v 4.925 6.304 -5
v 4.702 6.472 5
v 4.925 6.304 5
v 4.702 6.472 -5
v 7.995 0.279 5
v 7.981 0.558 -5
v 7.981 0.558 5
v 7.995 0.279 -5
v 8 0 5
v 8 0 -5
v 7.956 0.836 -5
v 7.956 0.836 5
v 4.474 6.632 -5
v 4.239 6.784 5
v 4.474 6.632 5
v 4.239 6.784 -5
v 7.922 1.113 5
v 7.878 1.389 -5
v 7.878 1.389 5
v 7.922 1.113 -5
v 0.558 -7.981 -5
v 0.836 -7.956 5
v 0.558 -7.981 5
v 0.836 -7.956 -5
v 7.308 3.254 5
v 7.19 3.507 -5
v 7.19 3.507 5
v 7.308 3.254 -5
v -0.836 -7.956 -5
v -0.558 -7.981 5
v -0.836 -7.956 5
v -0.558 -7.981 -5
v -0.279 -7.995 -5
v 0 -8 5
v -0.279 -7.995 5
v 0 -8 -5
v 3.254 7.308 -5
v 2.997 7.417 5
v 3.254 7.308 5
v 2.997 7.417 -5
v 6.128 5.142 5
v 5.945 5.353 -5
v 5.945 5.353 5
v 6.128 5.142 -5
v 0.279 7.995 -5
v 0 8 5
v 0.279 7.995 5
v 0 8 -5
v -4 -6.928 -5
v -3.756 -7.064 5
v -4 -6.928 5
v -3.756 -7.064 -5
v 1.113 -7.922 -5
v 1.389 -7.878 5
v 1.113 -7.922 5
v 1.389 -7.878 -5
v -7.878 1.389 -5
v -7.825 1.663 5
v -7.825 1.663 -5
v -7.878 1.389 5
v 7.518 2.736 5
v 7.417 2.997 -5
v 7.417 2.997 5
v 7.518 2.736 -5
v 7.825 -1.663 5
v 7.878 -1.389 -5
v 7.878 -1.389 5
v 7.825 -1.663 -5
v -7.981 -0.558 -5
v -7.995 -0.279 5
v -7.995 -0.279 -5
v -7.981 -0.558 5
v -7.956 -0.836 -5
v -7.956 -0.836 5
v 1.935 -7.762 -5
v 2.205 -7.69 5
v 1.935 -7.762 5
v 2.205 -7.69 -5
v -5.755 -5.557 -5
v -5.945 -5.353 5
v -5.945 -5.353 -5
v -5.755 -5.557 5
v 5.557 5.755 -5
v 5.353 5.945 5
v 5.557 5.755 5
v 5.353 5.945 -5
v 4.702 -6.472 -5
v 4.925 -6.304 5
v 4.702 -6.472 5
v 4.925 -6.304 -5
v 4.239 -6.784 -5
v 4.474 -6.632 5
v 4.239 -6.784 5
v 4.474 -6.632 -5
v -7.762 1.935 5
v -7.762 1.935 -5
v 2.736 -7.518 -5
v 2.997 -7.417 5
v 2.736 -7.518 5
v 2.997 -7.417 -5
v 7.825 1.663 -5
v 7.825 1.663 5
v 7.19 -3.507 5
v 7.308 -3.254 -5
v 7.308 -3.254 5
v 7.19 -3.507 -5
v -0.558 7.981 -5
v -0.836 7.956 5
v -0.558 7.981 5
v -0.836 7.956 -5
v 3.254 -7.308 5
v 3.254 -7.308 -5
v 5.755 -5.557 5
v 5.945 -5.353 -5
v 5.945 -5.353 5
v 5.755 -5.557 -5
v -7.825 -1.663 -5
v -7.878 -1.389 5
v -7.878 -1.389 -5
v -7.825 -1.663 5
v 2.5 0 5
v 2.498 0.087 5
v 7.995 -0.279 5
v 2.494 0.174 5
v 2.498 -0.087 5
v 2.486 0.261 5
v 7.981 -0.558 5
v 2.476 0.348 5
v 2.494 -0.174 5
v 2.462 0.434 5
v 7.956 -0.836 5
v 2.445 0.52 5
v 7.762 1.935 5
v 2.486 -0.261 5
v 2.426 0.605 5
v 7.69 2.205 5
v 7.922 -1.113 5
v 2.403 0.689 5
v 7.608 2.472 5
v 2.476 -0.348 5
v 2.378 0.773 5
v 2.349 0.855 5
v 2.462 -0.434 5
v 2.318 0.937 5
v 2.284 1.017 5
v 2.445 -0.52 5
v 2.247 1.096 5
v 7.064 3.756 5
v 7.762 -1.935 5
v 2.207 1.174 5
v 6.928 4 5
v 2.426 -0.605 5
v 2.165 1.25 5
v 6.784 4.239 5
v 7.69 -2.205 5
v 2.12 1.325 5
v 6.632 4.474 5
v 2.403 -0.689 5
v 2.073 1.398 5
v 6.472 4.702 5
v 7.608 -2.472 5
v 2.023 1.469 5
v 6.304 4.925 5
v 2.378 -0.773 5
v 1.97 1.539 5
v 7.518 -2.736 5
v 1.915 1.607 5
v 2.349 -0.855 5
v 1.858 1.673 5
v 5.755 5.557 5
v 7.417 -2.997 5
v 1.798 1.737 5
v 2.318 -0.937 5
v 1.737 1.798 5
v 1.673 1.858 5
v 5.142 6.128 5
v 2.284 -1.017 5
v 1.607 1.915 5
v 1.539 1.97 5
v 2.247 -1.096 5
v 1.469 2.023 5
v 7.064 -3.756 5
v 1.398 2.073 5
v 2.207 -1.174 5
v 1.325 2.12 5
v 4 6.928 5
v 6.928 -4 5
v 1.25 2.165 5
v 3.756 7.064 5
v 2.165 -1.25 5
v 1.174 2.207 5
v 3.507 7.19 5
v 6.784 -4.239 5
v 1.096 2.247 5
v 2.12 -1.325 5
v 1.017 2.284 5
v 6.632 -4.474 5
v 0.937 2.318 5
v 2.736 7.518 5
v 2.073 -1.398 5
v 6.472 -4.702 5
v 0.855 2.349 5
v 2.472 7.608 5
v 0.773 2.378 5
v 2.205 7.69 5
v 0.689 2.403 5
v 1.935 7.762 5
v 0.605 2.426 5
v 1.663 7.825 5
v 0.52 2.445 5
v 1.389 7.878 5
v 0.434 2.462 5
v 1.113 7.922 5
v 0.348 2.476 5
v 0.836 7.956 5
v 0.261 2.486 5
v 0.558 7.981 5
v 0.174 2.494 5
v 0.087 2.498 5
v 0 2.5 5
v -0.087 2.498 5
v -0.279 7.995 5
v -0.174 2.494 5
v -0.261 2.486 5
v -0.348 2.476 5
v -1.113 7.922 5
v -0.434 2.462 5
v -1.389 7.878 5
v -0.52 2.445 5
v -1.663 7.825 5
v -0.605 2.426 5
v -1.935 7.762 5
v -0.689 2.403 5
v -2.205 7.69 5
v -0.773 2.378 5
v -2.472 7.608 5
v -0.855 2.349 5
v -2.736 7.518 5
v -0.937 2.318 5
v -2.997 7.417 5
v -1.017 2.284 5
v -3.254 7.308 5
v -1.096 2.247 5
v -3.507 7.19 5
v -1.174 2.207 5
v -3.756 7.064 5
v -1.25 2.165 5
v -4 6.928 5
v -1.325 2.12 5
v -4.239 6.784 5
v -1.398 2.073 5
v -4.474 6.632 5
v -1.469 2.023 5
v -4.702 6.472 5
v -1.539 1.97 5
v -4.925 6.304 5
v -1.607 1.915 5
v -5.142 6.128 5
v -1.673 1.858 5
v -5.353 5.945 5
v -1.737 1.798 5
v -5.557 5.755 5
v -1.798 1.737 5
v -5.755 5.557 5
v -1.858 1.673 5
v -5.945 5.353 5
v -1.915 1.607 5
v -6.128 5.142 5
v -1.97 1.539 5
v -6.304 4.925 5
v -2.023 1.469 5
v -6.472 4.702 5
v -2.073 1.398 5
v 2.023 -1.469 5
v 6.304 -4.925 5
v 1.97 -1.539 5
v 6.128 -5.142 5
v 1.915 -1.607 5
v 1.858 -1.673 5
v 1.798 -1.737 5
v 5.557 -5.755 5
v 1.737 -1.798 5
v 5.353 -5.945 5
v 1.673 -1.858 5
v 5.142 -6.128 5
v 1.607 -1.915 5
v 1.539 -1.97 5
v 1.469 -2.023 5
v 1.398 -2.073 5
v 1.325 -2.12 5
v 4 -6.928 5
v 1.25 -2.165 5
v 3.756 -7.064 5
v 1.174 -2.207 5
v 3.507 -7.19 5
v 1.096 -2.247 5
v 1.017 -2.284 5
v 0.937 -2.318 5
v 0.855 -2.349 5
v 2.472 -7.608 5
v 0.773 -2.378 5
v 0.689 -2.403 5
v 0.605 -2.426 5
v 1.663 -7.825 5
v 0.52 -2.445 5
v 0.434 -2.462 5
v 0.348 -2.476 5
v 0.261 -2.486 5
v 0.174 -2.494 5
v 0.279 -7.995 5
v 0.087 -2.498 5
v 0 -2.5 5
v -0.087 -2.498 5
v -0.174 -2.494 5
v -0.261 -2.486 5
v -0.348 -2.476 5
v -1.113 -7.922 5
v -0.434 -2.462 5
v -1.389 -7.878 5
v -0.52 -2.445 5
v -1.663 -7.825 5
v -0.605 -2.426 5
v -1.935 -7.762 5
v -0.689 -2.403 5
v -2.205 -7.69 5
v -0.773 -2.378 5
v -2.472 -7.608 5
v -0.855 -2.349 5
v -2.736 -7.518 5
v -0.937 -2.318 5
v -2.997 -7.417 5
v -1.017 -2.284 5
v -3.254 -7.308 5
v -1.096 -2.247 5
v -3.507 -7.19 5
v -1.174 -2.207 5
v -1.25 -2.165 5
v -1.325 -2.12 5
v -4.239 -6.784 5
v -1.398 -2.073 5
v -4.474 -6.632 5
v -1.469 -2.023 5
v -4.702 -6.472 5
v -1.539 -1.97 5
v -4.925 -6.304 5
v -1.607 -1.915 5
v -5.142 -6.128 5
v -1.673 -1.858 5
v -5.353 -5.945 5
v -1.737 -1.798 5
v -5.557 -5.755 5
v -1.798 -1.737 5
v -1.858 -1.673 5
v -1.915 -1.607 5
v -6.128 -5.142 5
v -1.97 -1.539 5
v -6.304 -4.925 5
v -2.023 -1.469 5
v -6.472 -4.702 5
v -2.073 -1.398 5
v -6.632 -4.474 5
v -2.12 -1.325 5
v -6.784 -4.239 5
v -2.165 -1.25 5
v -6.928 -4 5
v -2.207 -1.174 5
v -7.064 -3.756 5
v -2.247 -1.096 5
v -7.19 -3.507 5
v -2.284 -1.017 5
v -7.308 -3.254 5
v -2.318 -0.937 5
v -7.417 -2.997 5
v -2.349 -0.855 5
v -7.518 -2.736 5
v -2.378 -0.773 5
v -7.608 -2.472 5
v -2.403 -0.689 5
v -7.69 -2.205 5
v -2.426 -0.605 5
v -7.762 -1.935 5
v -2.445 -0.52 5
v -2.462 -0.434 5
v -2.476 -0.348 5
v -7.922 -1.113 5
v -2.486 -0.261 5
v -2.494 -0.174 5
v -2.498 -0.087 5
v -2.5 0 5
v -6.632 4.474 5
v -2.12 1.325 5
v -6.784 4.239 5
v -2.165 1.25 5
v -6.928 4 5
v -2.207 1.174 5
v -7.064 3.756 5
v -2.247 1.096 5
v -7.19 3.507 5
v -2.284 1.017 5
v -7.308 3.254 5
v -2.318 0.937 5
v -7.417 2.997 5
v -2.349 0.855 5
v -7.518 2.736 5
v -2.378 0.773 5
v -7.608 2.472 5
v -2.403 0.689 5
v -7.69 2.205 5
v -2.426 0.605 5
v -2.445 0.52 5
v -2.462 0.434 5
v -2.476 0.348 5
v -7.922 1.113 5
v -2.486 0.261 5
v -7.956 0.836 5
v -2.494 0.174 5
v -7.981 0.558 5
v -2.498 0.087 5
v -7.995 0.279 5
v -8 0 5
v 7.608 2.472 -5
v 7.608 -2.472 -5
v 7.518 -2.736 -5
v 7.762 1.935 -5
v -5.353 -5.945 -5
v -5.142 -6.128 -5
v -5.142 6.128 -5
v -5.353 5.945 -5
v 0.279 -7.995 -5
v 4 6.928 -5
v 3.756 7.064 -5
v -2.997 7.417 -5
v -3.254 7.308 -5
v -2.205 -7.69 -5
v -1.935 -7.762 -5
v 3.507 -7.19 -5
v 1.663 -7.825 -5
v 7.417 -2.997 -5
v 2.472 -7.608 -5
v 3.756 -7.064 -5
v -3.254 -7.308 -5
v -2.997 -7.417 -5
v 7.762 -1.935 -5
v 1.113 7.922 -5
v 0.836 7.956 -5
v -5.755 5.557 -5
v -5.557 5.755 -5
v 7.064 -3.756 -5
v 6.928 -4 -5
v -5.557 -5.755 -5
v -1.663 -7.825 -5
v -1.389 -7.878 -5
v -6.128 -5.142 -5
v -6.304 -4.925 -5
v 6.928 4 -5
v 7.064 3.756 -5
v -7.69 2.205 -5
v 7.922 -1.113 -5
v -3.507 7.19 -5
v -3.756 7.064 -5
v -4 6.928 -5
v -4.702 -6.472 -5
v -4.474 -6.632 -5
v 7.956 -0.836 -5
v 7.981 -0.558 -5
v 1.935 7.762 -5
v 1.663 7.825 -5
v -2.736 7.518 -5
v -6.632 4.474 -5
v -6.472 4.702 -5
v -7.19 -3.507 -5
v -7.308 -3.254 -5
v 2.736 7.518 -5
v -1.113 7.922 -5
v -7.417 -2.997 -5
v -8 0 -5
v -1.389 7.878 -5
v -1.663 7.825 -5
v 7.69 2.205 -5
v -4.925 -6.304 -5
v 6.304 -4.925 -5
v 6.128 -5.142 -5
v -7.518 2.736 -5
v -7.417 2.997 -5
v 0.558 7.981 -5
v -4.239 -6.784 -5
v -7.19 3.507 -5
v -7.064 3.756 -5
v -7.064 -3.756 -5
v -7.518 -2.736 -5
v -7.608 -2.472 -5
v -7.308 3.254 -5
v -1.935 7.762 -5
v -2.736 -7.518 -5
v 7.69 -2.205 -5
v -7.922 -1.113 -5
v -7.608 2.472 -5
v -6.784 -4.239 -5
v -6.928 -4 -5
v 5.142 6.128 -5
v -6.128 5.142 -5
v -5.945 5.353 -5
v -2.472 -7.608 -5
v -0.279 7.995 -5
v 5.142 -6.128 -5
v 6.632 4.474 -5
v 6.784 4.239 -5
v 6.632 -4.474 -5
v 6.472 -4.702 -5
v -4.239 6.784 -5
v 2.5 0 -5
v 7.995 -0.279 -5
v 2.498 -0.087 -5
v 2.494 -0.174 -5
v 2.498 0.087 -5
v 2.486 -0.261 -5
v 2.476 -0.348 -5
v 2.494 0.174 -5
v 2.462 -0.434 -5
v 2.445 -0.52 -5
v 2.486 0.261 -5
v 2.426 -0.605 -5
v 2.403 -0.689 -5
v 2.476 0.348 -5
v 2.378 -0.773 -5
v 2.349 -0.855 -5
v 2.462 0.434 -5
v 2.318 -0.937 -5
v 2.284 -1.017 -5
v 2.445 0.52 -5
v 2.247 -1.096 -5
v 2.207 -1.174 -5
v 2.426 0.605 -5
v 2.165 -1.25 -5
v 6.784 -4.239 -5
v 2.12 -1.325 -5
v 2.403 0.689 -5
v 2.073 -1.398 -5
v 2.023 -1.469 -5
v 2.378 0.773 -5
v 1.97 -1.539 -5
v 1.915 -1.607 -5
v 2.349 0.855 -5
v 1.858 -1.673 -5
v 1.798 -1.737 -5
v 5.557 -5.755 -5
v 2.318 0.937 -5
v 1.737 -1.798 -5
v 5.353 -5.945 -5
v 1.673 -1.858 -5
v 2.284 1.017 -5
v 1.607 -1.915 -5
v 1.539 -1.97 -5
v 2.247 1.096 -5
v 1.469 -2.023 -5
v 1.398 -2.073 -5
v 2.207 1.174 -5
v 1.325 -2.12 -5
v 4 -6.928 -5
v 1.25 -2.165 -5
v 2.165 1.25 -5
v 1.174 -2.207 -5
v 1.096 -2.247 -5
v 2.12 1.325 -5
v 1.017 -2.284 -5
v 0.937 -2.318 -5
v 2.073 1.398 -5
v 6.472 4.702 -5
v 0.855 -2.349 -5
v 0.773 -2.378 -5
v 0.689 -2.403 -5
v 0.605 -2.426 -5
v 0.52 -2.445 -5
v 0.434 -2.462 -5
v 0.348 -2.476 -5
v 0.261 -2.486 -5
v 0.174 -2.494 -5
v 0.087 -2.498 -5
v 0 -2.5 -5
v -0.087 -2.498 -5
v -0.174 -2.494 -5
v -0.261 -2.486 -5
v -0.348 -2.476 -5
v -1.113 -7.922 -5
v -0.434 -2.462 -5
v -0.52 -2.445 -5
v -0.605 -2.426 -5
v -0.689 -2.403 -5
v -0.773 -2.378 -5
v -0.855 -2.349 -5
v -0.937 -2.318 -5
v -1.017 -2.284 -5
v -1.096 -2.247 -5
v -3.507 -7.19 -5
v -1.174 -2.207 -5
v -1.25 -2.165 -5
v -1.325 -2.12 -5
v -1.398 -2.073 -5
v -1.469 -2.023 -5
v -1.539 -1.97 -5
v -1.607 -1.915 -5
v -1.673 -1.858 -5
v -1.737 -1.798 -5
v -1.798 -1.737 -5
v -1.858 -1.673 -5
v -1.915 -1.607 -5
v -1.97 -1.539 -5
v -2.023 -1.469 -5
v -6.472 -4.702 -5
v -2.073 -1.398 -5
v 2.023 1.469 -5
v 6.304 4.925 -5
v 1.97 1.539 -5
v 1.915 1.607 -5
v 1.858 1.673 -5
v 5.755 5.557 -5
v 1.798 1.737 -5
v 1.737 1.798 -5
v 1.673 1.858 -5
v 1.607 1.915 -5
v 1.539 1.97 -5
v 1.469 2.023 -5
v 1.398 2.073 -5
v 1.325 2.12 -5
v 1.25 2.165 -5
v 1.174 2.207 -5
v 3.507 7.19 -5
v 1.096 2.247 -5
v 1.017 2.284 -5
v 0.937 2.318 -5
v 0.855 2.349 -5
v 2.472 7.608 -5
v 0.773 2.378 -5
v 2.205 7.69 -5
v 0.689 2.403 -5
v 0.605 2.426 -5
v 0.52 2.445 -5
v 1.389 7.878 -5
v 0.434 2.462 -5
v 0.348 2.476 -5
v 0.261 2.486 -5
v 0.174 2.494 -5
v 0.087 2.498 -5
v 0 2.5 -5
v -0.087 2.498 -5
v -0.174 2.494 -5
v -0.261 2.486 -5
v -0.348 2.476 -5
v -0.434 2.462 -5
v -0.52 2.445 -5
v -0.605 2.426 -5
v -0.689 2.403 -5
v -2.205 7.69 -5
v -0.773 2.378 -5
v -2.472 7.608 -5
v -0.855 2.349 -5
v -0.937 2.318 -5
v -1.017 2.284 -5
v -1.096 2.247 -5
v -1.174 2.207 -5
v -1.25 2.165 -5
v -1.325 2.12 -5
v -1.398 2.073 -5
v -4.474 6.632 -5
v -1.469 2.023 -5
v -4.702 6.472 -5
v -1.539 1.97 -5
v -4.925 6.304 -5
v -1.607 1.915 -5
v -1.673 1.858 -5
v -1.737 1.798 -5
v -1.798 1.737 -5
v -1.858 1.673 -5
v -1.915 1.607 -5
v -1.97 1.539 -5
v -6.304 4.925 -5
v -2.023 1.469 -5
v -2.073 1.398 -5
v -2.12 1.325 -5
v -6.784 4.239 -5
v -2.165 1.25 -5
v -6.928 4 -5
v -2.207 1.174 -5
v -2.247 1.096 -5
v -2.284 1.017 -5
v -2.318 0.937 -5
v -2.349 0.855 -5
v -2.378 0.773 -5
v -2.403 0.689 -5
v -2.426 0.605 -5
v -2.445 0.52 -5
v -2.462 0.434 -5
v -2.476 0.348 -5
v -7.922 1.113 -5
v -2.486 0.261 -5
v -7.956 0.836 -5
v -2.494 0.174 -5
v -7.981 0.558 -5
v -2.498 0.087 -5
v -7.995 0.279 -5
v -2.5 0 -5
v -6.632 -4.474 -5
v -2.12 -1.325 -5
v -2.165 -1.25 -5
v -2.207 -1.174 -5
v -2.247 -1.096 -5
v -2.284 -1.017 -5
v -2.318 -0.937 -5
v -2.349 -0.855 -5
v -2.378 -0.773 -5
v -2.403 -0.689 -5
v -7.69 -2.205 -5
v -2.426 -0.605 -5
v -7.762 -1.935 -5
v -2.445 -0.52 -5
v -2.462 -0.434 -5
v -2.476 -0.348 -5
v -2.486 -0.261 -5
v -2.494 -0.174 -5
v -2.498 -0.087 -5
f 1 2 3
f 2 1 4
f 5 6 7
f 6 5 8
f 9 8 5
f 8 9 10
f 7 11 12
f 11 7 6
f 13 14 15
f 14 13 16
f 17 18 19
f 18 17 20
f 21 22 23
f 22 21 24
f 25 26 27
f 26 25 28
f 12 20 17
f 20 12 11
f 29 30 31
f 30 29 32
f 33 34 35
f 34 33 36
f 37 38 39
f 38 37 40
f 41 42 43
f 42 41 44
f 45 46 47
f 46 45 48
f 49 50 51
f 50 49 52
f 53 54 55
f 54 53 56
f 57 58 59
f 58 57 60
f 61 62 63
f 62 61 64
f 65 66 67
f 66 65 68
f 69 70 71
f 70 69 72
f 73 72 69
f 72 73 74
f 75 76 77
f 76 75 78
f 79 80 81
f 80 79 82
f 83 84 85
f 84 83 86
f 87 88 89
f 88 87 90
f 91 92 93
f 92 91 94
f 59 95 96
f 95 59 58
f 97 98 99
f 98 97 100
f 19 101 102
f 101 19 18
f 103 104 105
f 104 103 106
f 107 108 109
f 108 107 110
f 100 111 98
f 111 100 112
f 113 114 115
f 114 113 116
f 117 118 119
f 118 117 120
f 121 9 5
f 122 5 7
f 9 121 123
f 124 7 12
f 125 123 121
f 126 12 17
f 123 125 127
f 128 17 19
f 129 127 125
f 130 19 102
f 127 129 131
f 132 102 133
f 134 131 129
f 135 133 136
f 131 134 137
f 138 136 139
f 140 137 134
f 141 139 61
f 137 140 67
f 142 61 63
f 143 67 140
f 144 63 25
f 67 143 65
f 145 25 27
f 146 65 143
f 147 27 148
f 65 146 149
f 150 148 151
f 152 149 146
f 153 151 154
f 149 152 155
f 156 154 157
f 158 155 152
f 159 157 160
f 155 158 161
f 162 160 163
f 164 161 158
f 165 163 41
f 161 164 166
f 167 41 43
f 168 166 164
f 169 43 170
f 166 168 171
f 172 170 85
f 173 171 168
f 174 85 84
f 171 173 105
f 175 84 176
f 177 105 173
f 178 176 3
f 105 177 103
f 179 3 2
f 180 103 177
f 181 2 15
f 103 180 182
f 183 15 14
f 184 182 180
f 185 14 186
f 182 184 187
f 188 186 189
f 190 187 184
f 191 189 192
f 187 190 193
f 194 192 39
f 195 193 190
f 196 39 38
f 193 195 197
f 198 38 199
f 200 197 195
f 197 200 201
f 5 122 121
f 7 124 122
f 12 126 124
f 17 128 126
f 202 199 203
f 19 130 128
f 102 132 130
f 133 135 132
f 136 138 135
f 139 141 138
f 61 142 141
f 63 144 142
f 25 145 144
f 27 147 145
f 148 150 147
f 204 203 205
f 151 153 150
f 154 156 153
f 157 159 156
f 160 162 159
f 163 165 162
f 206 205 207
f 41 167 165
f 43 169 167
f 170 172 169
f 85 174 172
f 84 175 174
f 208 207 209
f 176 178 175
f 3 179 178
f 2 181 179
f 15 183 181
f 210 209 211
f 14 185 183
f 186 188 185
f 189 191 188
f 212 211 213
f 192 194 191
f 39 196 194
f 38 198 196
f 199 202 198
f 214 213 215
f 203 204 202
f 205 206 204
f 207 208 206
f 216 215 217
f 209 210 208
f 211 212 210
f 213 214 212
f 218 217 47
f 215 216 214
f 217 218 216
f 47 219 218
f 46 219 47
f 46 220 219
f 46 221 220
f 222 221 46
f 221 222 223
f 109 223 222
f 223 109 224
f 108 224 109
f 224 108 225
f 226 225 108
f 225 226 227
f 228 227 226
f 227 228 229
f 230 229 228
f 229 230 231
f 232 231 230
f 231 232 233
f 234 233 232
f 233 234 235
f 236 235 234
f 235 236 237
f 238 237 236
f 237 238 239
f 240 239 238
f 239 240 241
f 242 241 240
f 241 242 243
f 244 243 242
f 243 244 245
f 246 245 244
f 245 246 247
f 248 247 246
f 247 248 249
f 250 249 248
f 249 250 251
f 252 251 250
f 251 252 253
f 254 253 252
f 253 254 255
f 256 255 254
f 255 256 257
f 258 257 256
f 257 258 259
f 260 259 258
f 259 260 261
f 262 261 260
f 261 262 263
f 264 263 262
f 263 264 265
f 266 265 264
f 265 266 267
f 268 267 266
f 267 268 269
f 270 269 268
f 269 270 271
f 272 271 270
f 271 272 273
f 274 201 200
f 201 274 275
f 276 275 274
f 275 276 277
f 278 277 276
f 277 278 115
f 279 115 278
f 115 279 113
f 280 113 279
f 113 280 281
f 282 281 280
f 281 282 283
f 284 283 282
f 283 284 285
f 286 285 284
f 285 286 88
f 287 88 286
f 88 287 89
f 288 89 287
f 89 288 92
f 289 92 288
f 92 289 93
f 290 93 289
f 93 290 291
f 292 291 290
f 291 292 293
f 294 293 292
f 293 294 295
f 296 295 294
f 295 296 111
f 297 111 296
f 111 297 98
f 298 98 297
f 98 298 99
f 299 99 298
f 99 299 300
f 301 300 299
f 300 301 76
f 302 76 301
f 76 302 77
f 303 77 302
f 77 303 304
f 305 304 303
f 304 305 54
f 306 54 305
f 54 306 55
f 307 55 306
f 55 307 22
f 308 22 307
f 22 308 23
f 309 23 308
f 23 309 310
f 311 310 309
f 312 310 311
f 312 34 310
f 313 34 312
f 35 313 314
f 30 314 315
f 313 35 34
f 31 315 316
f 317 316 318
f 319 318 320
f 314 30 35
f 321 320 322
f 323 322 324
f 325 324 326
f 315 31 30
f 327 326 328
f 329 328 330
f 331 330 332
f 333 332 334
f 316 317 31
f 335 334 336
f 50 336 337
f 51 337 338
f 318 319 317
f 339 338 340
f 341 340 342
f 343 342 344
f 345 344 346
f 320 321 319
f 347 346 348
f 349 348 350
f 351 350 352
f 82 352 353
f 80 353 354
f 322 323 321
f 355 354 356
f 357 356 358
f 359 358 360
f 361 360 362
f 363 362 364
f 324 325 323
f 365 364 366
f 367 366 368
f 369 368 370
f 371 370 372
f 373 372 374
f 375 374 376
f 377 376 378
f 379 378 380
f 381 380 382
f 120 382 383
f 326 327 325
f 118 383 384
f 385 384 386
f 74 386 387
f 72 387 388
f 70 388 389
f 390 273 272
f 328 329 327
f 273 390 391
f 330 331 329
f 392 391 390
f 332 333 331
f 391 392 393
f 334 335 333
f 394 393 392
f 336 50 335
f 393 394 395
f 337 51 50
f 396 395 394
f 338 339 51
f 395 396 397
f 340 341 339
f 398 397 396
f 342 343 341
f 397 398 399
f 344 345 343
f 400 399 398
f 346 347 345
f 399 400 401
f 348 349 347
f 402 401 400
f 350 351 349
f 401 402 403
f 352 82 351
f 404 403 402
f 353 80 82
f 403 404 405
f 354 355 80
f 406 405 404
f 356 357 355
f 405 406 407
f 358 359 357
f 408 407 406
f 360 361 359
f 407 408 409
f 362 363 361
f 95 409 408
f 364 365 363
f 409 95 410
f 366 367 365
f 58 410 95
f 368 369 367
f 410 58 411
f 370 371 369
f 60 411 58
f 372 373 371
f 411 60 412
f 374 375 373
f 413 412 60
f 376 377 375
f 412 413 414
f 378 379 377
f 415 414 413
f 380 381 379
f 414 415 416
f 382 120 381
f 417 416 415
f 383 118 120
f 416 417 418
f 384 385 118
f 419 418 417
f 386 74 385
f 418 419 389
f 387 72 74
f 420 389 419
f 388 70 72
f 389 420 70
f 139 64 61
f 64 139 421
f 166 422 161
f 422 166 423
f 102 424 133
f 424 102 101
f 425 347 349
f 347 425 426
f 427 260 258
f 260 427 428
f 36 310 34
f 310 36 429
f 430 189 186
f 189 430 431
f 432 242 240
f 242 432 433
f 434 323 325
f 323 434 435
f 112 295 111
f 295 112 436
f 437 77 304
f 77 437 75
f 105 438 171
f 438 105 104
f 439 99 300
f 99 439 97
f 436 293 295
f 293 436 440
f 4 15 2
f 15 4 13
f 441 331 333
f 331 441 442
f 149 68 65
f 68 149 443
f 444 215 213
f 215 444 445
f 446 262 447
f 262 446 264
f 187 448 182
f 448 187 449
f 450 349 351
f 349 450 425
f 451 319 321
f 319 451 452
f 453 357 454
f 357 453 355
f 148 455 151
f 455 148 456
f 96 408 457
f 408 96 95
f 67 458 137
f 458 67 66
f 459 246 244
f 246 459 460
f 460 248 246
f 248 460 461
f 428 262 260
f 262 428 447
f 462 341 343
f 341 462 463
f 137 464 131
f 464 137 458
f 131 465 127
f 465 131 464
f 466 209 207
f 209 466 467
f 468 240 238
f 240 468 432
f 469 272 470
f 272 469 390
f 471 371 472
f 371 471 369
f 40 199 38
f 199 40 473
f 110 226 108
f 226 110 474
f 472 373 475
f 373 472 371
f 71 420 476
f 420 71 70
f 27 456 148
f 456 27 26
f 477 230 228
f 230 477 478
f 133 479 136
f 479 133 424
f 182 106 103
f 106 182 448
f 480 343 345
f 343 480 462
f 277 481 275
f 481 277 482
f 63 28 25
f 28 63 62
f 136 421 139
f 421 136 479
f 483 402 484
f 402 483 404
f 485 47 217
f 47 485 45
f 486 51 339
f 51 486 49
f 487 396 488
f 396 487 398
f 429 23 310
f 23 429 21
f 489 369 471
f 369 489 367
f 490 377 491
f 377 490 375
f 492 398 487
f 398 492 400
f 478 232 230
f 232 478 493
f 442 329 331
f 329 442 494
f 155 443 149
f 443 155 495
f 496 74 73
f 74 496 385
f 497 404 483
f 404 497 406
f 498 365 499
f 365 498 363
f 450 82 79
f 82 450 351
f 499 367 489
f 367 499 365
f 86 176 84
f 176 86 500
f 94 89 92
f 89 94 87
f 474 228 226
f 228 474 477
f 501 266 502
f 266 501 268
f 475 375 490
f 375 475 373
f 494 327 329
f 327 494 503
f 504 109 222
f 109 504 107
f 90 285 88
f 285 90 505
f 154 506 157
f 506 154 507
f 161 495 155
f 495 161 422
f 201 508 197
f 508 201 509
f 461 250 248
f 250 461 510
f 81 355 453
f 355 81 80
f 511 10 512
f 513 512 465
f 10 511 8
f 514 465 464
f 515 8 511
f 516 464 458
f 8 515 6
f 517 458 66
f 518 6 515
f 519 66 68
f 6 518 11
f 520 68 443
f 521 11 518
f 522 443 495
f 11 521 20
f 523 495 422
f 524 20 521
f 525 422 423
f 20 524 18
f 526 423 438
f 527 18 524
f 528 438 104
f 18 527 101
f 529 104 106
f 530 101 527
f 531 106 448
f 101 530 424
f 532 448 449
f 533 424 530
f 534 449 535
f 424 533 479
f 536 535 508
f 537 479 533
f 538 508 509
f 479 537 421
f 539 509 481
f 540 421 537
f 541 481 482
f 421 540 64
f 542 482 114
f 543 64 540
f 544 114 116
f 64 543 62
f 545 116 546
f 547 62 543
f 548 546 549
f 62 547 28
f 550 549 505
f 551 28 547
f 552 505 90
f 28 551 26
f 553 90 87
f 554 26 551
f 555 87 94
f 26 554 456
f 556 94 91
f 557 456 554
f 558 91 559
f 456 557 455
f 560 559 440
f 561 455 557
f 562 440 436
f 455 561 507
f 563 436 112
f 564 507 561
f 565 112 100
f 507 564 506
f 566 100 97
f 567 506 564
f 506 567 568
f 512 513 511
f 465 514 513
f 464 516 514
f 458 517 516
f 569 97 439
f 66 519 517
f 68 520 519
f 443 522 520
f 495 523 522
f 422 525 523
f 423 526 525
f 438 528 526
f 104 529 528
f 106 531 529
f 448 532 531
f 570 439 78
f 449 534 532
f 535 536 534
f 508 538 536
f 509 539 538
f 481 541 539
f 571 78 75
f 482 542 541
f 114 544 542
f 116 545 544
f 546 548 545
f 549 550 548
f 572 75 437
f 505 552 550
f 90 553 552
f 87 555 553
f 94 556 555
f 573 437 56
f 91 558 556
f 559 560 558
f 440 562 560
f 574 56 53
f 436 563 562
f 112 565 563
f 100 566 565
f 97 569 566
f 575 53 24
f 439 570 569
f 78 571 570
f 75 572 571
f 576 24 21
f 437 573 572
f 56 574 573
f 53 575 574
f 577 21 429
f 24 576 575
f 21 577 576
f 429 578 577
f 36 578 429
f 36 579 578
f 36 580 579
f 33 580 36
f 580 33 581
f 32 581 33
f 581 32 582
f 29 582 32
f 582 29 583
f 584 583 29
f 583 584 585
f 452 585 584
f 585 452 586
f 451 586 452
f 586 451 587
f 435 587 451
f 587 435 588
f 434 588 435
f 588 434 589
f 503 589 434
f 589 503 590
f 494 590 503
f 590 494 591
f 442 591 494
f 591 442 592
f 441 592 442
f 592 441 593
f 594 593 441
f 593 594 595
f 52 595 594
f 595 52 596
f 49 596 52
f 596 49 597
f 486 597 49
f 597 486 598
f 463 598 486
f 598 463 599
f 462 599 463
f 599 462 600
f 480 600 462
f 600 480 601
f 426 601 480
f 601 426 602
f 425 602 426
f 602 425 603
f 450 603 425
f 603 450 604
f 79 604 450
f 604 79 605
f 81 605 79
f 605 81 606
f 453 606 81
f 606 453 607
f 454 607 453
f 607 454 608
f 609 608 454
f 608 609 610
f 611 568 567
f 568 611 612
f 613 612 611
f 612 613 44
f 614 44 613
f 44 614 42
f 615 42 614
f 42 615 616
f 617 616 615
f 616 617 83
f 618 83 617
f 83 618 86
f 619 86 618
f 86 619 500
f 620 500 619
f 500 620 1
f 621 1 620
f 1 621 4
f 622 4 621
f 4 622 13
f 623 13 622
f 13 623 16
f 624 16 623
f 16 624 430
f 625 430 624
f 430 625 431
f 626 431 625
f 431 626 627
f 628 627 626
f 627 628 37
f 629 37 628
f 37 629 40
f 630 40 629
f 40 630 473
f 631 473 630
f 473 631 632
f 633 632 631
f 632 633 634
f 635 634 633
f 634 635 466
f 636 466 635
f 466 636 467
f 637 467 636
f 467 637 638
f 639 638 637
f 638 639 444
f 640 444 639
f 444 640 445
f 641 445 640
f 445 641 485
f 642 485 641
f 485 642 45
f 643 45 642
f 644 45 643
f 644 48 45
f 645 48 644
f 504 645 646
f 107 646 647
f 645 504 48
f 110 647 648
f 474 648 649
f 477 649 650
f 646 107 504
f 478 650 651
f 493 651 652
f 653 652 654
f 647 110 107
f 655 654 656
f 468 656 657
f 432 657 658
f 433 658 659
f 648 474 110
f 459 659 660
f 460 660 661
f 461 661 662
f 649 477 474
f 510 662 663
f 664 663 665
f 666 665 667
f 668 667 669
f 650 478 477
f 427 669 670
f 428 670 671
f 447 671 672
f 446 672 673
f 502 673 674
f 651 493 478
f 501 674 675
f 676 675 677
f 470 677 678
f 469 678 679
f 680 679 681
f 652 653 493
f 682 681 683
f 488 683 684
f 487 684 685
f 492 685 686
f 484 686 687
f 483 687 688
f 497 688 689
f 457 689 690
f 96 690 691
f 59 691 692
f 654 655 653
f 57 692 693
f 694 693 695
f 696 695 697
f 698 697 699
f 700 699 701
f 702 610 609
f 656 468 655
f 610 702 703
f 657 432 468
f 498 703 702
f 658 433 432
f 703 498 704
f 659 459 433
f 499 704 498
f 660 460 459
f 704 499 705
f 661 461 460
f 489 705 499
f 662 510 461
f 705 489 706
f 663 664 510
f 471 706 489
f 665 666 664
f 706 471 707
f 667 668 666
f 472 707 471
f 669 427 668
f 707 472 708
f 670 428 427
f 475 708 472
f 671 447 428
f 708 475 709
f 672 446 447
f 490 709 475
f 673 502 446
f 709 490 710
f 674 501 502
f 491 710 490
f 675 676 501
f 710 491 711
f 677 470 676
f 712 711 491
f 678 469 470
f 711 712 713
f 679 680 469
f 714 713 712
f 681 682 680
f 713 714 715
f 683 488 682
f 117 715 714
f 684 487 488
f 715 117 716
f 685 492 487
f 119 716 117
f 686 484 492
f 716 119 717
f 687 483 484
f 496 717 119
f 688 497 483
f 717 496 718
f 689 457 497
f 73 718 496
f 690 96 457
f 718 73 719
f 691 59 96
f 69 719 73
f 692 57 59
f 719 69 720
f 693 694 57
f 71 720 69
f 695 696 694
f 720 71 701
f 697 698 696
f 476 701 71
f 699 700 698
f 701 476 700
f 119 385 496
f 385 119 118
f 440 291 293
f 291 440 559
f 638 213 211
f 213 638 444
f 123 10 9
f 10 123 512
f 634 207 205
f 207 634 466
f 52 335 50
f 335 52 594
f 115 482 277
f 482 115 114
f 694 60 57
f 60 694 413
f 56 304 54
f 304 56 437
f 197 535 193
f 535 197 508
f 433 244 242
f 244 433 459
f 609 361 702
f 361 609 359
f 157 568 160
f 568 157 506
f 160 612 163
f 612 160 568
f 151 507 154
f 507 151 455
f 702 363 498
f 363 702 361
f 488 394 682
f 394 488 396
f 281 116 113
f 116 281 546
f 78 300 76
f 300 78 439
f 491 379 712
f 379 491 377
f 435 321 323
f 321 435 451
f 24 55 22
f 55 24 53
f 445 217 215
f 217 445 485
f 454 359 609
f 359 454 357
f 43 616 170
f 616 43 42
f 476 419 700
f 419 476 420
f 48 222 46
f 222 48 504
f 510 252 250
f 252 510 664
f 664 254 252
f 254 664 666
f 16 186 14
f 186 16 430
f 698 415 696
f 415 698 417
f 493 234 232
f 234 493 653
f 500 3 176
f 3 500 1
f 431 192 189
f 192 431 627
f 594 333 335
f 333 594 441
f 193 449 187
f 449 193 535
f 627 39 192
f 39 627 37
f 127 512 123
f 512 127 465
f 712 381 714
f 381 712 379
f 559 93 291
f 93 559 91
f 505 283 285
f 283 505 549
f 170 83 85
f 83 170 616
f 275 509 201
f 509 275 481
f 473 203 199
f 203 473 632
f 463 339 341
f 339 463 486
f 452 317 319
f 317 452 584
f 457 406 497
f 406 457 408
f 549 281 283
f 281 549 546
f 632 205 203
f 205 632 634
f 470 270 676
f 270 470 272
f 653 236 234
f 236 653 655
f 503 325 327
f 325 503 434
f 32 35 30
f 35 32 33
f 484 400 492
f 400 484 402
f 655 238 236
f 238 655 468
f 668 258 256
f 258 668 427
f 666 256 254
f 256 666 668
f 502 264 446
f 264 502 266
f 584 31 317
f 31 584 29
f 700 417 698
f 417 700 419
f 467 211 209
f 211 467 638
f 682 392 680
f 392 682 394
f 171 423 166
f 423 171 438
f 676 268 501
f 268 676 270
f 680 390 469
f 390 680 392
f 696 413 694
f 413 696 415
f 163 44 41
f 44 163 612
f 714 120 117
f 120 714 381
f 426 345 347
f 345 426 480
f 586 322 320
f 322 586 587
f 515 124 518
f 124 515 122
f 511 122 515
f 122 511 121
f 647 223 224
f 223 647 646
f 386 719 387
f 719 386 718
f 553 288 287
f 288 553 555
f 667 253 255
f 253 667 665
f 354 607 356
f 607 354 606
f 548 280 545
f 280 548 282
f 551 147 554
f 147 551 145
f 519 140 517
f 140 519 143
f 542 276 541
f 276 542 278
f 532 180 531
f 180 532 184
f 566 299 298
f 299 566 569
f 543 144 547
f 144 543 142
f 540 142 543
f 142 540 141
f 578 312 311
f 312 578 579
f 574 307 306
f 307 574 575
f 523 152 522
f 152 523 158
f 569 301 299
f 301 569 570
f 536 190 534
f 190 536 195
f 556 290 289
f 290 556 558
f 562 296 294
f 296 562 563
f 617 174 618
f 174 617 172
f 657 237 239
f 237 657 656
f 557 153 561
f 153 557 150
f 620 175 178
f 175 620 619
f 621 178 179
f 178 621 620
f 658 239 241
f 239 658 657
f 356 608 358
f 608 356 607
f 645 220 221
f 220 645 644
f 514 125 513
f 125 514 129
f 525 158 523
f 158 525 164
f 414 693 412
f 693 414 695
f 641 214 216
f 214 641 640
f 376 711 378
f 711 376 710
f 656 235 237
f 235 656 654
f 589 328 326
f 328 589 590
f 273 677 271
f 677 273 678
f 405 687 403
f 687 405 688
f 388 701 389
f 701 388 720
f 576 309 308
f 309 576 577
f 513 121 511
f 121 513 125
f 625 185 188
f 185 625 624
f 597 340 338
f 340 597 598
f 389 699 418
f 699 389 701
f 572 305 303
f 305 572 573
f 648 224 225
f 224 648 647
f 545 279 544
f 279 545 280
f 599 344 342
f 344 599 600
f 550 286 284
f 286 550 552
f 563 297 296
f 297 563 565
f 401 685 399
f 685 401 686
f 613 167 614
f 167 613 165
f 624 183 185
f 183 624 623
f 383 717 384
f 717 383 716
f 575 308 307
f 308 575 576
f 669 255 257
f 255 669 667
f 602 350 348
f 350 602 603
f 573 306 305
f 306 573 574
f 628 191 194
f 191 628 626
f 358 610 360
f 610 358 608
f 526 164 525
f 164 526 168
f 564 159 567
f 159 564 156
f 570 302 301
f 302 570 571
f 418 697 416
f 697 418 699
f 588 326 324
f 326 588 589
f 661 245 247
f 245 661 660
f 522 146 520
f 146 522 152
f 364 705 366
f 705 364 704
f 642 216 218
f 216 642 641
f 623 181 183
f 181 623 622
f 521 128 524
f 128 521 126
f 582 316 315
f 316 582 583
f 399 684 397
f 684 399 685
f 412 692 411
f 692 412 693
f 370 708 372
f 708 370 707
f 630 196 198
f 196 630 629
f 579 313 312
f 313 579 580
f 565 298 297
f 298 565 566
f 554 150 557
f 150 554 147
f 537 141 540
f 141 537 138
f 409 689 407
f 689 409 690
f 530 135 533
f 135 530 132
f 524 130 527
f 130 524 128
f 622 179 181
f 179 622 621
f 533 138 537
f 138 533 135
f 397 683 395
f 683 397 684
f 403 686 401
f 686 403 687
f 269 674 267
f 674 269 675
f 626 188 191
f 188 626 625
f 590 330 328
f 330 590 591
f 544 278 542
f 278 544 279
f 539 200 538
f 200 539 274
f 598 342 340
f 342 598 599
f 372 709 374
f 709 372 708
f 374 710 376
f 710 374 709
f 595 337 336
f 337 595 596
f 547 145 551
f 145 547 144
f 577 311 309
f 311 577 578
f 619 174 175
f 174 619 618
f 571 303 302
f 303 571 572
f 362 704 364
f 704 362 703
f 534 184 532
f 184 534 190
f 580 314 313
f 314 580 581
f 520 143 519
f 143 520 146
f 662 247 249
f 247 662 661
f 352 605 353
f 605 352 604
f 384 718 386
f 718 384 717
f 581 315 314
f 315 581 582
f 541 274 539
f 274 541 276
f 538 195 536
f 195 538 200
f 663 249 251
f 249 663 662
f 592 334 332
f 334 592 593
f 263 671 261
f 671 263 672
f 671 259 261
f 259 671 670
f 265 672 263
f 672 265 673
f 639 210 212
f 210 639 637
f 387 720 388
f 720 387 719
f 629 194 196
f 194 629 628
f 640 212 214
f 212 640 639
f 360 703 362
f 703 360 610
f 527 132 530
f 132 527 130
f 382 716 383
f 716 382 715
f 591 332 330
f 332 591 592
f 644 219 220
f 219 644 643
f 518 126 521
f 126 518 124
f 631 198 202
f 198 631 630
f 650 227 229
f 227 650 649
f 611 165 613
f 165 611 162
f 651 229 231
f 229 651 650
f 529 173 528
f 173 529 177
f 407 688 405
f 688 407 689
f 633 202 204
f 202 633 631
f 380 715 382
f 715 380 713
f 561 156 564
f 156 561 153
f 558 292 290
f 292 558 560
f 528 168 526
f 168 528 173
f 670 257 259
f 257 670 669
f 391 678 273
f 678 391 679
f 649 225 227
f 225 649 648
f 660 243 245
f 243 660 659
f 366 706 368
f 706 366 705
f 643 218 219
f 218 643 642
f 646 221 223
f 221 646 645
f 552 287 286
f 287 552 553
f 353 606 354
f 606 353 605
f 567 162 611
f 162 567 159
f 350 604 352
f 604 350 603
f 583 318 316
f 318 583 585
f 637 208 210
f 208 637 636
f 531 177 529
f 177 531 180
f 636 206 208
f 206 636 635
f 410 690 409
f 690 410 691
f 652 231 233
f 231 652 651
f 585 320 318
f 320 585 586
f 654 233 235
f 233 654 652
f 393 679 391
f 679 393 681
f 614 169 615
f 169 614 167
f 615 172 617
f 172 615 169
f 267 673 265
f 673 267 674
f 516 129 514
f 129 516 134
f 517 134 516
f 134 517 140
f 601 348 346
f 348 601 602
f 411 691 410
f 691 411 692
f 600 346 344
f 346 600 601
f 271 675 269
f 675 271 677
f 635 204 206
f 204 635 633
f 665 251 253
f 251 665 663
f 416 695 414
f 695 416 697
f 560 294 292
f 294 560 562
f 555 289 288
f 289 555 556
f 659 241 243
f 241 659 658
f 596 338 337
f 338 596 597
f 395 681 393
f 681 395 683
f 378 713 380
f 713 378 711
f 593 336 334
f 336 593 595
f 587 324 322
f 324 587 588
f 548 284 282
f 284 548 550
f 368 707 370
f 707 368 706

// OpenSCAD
$fn = 180;

// Timing pulley (approximate GT2-like tooth form)
// User specs:
teeth = 20;
pitch_diameter = 12.22;   // mm
pitch_radius = pitch_diameter/2;

// Pulley body parameters (editable)
pulley_width = 10;        // mm
hub_diameter = 16;        // mm (outer diameter of main body)
bore_diameter = 5;        // mm (shaft hole)

// Tooth parameters (approximate)
tooth_height = 0.75;      // radial height above pitch circle
tooth_tip_width = 0.9;    // mm (circumferential width at tooth tip)
tooth_root_width = 1.6;   // mm (circumferential width at tooth root)
tooth_root_relief = 0.25; // mm (small relief below pitch circle)

// Derived
pitch_circumference = PI * pitch_diameter;
pitch = pitch_circumference / teeth;
angle_step = 360 / teeth;

// Base radii
r_pitch = pitch_radius;
r_root  = max(0.1, r_pitch - tooth_root_relief);
r_tip   = r_pitch + tooth_height;

// Ensure body radius at least covers tooth root
r_body = max(hub_diameter/2, r_root + 0.2);

module tooth2d() {
    // A simple trapezoid tooth in polar placement:
    // root at r_root, tip at r_tip, widths are chord-like approximations.
    polygon(points=[
        [r_root, -tooth_root_width/2],
        [r_tip,  -tooth_tip_width/2],
        [r_tip,   tooth_tip_width/2],
        [r_root,  tooth_root_width/2]
    ]);
}

module tooth3d() {
    // Convert the 2D trapezoid (in x=radius, y=tangential) into 3D by:
    // - translating so x is radial from origin
    // - rotating around Z for each tooth
    // - linear extruding along Z
    linear_extrude(height=pulley_width, center=true)
        // Map (radius, tangential) to (x,y) by placing radius along +X and tangential along +Y
        // Already in that coordinate system.
        tooth2d();
}

module pulley_body() {
    difference() {
        cylinder(h=pulley_width, r=r_body, center=true);
        cylinder(h=pulley_width+2, r=bore_diameter/2, center=true);
    }
}

module pulley_teeth() {
    for (i = [0:teeth-1]) {
        rotate([0,0,i*angle_step])
            translate([0,0,0])
                tooth3d();
    }
}

difference() {
    union() {
        pulley_body();
        // Teeth are positioned so their root sits near r_root; tooth2d uses x=r directly.
        // We need to rotate the tooth shape so its radial axis aligns with global X.
        // Then translate it so its root starts at r_root from origin.
        // Since tooth2d already uses x=r, we must shift it so r=0 maps to origin.
        // Achieve by translating the 2D polygon left by r_root, then translating whole tooth out by r_root.
        // Simpler: wrap tooth3d with a translate that moves it so r_root aligns at origin.
        // We'll implement by translating the 2D polygon by -r_root in X, then translating by r_root in X.
        // Net effect: none. So instead, define tooth2d in absolute radius coordinates (already).
        // Therefore, we must place it at origin with no extra translation.
        // But polygon x-coordinates are radii; that means the tooth spans from x=r_root..r_tip.
        // That is correct when origin is at pulley center.
        pulley_teeth();
    }
    // Trim anything inside the body radius to avoid internal overlaps (optional cleanup)
    // Not strictly necessary; keep as-is for renderability.
}
